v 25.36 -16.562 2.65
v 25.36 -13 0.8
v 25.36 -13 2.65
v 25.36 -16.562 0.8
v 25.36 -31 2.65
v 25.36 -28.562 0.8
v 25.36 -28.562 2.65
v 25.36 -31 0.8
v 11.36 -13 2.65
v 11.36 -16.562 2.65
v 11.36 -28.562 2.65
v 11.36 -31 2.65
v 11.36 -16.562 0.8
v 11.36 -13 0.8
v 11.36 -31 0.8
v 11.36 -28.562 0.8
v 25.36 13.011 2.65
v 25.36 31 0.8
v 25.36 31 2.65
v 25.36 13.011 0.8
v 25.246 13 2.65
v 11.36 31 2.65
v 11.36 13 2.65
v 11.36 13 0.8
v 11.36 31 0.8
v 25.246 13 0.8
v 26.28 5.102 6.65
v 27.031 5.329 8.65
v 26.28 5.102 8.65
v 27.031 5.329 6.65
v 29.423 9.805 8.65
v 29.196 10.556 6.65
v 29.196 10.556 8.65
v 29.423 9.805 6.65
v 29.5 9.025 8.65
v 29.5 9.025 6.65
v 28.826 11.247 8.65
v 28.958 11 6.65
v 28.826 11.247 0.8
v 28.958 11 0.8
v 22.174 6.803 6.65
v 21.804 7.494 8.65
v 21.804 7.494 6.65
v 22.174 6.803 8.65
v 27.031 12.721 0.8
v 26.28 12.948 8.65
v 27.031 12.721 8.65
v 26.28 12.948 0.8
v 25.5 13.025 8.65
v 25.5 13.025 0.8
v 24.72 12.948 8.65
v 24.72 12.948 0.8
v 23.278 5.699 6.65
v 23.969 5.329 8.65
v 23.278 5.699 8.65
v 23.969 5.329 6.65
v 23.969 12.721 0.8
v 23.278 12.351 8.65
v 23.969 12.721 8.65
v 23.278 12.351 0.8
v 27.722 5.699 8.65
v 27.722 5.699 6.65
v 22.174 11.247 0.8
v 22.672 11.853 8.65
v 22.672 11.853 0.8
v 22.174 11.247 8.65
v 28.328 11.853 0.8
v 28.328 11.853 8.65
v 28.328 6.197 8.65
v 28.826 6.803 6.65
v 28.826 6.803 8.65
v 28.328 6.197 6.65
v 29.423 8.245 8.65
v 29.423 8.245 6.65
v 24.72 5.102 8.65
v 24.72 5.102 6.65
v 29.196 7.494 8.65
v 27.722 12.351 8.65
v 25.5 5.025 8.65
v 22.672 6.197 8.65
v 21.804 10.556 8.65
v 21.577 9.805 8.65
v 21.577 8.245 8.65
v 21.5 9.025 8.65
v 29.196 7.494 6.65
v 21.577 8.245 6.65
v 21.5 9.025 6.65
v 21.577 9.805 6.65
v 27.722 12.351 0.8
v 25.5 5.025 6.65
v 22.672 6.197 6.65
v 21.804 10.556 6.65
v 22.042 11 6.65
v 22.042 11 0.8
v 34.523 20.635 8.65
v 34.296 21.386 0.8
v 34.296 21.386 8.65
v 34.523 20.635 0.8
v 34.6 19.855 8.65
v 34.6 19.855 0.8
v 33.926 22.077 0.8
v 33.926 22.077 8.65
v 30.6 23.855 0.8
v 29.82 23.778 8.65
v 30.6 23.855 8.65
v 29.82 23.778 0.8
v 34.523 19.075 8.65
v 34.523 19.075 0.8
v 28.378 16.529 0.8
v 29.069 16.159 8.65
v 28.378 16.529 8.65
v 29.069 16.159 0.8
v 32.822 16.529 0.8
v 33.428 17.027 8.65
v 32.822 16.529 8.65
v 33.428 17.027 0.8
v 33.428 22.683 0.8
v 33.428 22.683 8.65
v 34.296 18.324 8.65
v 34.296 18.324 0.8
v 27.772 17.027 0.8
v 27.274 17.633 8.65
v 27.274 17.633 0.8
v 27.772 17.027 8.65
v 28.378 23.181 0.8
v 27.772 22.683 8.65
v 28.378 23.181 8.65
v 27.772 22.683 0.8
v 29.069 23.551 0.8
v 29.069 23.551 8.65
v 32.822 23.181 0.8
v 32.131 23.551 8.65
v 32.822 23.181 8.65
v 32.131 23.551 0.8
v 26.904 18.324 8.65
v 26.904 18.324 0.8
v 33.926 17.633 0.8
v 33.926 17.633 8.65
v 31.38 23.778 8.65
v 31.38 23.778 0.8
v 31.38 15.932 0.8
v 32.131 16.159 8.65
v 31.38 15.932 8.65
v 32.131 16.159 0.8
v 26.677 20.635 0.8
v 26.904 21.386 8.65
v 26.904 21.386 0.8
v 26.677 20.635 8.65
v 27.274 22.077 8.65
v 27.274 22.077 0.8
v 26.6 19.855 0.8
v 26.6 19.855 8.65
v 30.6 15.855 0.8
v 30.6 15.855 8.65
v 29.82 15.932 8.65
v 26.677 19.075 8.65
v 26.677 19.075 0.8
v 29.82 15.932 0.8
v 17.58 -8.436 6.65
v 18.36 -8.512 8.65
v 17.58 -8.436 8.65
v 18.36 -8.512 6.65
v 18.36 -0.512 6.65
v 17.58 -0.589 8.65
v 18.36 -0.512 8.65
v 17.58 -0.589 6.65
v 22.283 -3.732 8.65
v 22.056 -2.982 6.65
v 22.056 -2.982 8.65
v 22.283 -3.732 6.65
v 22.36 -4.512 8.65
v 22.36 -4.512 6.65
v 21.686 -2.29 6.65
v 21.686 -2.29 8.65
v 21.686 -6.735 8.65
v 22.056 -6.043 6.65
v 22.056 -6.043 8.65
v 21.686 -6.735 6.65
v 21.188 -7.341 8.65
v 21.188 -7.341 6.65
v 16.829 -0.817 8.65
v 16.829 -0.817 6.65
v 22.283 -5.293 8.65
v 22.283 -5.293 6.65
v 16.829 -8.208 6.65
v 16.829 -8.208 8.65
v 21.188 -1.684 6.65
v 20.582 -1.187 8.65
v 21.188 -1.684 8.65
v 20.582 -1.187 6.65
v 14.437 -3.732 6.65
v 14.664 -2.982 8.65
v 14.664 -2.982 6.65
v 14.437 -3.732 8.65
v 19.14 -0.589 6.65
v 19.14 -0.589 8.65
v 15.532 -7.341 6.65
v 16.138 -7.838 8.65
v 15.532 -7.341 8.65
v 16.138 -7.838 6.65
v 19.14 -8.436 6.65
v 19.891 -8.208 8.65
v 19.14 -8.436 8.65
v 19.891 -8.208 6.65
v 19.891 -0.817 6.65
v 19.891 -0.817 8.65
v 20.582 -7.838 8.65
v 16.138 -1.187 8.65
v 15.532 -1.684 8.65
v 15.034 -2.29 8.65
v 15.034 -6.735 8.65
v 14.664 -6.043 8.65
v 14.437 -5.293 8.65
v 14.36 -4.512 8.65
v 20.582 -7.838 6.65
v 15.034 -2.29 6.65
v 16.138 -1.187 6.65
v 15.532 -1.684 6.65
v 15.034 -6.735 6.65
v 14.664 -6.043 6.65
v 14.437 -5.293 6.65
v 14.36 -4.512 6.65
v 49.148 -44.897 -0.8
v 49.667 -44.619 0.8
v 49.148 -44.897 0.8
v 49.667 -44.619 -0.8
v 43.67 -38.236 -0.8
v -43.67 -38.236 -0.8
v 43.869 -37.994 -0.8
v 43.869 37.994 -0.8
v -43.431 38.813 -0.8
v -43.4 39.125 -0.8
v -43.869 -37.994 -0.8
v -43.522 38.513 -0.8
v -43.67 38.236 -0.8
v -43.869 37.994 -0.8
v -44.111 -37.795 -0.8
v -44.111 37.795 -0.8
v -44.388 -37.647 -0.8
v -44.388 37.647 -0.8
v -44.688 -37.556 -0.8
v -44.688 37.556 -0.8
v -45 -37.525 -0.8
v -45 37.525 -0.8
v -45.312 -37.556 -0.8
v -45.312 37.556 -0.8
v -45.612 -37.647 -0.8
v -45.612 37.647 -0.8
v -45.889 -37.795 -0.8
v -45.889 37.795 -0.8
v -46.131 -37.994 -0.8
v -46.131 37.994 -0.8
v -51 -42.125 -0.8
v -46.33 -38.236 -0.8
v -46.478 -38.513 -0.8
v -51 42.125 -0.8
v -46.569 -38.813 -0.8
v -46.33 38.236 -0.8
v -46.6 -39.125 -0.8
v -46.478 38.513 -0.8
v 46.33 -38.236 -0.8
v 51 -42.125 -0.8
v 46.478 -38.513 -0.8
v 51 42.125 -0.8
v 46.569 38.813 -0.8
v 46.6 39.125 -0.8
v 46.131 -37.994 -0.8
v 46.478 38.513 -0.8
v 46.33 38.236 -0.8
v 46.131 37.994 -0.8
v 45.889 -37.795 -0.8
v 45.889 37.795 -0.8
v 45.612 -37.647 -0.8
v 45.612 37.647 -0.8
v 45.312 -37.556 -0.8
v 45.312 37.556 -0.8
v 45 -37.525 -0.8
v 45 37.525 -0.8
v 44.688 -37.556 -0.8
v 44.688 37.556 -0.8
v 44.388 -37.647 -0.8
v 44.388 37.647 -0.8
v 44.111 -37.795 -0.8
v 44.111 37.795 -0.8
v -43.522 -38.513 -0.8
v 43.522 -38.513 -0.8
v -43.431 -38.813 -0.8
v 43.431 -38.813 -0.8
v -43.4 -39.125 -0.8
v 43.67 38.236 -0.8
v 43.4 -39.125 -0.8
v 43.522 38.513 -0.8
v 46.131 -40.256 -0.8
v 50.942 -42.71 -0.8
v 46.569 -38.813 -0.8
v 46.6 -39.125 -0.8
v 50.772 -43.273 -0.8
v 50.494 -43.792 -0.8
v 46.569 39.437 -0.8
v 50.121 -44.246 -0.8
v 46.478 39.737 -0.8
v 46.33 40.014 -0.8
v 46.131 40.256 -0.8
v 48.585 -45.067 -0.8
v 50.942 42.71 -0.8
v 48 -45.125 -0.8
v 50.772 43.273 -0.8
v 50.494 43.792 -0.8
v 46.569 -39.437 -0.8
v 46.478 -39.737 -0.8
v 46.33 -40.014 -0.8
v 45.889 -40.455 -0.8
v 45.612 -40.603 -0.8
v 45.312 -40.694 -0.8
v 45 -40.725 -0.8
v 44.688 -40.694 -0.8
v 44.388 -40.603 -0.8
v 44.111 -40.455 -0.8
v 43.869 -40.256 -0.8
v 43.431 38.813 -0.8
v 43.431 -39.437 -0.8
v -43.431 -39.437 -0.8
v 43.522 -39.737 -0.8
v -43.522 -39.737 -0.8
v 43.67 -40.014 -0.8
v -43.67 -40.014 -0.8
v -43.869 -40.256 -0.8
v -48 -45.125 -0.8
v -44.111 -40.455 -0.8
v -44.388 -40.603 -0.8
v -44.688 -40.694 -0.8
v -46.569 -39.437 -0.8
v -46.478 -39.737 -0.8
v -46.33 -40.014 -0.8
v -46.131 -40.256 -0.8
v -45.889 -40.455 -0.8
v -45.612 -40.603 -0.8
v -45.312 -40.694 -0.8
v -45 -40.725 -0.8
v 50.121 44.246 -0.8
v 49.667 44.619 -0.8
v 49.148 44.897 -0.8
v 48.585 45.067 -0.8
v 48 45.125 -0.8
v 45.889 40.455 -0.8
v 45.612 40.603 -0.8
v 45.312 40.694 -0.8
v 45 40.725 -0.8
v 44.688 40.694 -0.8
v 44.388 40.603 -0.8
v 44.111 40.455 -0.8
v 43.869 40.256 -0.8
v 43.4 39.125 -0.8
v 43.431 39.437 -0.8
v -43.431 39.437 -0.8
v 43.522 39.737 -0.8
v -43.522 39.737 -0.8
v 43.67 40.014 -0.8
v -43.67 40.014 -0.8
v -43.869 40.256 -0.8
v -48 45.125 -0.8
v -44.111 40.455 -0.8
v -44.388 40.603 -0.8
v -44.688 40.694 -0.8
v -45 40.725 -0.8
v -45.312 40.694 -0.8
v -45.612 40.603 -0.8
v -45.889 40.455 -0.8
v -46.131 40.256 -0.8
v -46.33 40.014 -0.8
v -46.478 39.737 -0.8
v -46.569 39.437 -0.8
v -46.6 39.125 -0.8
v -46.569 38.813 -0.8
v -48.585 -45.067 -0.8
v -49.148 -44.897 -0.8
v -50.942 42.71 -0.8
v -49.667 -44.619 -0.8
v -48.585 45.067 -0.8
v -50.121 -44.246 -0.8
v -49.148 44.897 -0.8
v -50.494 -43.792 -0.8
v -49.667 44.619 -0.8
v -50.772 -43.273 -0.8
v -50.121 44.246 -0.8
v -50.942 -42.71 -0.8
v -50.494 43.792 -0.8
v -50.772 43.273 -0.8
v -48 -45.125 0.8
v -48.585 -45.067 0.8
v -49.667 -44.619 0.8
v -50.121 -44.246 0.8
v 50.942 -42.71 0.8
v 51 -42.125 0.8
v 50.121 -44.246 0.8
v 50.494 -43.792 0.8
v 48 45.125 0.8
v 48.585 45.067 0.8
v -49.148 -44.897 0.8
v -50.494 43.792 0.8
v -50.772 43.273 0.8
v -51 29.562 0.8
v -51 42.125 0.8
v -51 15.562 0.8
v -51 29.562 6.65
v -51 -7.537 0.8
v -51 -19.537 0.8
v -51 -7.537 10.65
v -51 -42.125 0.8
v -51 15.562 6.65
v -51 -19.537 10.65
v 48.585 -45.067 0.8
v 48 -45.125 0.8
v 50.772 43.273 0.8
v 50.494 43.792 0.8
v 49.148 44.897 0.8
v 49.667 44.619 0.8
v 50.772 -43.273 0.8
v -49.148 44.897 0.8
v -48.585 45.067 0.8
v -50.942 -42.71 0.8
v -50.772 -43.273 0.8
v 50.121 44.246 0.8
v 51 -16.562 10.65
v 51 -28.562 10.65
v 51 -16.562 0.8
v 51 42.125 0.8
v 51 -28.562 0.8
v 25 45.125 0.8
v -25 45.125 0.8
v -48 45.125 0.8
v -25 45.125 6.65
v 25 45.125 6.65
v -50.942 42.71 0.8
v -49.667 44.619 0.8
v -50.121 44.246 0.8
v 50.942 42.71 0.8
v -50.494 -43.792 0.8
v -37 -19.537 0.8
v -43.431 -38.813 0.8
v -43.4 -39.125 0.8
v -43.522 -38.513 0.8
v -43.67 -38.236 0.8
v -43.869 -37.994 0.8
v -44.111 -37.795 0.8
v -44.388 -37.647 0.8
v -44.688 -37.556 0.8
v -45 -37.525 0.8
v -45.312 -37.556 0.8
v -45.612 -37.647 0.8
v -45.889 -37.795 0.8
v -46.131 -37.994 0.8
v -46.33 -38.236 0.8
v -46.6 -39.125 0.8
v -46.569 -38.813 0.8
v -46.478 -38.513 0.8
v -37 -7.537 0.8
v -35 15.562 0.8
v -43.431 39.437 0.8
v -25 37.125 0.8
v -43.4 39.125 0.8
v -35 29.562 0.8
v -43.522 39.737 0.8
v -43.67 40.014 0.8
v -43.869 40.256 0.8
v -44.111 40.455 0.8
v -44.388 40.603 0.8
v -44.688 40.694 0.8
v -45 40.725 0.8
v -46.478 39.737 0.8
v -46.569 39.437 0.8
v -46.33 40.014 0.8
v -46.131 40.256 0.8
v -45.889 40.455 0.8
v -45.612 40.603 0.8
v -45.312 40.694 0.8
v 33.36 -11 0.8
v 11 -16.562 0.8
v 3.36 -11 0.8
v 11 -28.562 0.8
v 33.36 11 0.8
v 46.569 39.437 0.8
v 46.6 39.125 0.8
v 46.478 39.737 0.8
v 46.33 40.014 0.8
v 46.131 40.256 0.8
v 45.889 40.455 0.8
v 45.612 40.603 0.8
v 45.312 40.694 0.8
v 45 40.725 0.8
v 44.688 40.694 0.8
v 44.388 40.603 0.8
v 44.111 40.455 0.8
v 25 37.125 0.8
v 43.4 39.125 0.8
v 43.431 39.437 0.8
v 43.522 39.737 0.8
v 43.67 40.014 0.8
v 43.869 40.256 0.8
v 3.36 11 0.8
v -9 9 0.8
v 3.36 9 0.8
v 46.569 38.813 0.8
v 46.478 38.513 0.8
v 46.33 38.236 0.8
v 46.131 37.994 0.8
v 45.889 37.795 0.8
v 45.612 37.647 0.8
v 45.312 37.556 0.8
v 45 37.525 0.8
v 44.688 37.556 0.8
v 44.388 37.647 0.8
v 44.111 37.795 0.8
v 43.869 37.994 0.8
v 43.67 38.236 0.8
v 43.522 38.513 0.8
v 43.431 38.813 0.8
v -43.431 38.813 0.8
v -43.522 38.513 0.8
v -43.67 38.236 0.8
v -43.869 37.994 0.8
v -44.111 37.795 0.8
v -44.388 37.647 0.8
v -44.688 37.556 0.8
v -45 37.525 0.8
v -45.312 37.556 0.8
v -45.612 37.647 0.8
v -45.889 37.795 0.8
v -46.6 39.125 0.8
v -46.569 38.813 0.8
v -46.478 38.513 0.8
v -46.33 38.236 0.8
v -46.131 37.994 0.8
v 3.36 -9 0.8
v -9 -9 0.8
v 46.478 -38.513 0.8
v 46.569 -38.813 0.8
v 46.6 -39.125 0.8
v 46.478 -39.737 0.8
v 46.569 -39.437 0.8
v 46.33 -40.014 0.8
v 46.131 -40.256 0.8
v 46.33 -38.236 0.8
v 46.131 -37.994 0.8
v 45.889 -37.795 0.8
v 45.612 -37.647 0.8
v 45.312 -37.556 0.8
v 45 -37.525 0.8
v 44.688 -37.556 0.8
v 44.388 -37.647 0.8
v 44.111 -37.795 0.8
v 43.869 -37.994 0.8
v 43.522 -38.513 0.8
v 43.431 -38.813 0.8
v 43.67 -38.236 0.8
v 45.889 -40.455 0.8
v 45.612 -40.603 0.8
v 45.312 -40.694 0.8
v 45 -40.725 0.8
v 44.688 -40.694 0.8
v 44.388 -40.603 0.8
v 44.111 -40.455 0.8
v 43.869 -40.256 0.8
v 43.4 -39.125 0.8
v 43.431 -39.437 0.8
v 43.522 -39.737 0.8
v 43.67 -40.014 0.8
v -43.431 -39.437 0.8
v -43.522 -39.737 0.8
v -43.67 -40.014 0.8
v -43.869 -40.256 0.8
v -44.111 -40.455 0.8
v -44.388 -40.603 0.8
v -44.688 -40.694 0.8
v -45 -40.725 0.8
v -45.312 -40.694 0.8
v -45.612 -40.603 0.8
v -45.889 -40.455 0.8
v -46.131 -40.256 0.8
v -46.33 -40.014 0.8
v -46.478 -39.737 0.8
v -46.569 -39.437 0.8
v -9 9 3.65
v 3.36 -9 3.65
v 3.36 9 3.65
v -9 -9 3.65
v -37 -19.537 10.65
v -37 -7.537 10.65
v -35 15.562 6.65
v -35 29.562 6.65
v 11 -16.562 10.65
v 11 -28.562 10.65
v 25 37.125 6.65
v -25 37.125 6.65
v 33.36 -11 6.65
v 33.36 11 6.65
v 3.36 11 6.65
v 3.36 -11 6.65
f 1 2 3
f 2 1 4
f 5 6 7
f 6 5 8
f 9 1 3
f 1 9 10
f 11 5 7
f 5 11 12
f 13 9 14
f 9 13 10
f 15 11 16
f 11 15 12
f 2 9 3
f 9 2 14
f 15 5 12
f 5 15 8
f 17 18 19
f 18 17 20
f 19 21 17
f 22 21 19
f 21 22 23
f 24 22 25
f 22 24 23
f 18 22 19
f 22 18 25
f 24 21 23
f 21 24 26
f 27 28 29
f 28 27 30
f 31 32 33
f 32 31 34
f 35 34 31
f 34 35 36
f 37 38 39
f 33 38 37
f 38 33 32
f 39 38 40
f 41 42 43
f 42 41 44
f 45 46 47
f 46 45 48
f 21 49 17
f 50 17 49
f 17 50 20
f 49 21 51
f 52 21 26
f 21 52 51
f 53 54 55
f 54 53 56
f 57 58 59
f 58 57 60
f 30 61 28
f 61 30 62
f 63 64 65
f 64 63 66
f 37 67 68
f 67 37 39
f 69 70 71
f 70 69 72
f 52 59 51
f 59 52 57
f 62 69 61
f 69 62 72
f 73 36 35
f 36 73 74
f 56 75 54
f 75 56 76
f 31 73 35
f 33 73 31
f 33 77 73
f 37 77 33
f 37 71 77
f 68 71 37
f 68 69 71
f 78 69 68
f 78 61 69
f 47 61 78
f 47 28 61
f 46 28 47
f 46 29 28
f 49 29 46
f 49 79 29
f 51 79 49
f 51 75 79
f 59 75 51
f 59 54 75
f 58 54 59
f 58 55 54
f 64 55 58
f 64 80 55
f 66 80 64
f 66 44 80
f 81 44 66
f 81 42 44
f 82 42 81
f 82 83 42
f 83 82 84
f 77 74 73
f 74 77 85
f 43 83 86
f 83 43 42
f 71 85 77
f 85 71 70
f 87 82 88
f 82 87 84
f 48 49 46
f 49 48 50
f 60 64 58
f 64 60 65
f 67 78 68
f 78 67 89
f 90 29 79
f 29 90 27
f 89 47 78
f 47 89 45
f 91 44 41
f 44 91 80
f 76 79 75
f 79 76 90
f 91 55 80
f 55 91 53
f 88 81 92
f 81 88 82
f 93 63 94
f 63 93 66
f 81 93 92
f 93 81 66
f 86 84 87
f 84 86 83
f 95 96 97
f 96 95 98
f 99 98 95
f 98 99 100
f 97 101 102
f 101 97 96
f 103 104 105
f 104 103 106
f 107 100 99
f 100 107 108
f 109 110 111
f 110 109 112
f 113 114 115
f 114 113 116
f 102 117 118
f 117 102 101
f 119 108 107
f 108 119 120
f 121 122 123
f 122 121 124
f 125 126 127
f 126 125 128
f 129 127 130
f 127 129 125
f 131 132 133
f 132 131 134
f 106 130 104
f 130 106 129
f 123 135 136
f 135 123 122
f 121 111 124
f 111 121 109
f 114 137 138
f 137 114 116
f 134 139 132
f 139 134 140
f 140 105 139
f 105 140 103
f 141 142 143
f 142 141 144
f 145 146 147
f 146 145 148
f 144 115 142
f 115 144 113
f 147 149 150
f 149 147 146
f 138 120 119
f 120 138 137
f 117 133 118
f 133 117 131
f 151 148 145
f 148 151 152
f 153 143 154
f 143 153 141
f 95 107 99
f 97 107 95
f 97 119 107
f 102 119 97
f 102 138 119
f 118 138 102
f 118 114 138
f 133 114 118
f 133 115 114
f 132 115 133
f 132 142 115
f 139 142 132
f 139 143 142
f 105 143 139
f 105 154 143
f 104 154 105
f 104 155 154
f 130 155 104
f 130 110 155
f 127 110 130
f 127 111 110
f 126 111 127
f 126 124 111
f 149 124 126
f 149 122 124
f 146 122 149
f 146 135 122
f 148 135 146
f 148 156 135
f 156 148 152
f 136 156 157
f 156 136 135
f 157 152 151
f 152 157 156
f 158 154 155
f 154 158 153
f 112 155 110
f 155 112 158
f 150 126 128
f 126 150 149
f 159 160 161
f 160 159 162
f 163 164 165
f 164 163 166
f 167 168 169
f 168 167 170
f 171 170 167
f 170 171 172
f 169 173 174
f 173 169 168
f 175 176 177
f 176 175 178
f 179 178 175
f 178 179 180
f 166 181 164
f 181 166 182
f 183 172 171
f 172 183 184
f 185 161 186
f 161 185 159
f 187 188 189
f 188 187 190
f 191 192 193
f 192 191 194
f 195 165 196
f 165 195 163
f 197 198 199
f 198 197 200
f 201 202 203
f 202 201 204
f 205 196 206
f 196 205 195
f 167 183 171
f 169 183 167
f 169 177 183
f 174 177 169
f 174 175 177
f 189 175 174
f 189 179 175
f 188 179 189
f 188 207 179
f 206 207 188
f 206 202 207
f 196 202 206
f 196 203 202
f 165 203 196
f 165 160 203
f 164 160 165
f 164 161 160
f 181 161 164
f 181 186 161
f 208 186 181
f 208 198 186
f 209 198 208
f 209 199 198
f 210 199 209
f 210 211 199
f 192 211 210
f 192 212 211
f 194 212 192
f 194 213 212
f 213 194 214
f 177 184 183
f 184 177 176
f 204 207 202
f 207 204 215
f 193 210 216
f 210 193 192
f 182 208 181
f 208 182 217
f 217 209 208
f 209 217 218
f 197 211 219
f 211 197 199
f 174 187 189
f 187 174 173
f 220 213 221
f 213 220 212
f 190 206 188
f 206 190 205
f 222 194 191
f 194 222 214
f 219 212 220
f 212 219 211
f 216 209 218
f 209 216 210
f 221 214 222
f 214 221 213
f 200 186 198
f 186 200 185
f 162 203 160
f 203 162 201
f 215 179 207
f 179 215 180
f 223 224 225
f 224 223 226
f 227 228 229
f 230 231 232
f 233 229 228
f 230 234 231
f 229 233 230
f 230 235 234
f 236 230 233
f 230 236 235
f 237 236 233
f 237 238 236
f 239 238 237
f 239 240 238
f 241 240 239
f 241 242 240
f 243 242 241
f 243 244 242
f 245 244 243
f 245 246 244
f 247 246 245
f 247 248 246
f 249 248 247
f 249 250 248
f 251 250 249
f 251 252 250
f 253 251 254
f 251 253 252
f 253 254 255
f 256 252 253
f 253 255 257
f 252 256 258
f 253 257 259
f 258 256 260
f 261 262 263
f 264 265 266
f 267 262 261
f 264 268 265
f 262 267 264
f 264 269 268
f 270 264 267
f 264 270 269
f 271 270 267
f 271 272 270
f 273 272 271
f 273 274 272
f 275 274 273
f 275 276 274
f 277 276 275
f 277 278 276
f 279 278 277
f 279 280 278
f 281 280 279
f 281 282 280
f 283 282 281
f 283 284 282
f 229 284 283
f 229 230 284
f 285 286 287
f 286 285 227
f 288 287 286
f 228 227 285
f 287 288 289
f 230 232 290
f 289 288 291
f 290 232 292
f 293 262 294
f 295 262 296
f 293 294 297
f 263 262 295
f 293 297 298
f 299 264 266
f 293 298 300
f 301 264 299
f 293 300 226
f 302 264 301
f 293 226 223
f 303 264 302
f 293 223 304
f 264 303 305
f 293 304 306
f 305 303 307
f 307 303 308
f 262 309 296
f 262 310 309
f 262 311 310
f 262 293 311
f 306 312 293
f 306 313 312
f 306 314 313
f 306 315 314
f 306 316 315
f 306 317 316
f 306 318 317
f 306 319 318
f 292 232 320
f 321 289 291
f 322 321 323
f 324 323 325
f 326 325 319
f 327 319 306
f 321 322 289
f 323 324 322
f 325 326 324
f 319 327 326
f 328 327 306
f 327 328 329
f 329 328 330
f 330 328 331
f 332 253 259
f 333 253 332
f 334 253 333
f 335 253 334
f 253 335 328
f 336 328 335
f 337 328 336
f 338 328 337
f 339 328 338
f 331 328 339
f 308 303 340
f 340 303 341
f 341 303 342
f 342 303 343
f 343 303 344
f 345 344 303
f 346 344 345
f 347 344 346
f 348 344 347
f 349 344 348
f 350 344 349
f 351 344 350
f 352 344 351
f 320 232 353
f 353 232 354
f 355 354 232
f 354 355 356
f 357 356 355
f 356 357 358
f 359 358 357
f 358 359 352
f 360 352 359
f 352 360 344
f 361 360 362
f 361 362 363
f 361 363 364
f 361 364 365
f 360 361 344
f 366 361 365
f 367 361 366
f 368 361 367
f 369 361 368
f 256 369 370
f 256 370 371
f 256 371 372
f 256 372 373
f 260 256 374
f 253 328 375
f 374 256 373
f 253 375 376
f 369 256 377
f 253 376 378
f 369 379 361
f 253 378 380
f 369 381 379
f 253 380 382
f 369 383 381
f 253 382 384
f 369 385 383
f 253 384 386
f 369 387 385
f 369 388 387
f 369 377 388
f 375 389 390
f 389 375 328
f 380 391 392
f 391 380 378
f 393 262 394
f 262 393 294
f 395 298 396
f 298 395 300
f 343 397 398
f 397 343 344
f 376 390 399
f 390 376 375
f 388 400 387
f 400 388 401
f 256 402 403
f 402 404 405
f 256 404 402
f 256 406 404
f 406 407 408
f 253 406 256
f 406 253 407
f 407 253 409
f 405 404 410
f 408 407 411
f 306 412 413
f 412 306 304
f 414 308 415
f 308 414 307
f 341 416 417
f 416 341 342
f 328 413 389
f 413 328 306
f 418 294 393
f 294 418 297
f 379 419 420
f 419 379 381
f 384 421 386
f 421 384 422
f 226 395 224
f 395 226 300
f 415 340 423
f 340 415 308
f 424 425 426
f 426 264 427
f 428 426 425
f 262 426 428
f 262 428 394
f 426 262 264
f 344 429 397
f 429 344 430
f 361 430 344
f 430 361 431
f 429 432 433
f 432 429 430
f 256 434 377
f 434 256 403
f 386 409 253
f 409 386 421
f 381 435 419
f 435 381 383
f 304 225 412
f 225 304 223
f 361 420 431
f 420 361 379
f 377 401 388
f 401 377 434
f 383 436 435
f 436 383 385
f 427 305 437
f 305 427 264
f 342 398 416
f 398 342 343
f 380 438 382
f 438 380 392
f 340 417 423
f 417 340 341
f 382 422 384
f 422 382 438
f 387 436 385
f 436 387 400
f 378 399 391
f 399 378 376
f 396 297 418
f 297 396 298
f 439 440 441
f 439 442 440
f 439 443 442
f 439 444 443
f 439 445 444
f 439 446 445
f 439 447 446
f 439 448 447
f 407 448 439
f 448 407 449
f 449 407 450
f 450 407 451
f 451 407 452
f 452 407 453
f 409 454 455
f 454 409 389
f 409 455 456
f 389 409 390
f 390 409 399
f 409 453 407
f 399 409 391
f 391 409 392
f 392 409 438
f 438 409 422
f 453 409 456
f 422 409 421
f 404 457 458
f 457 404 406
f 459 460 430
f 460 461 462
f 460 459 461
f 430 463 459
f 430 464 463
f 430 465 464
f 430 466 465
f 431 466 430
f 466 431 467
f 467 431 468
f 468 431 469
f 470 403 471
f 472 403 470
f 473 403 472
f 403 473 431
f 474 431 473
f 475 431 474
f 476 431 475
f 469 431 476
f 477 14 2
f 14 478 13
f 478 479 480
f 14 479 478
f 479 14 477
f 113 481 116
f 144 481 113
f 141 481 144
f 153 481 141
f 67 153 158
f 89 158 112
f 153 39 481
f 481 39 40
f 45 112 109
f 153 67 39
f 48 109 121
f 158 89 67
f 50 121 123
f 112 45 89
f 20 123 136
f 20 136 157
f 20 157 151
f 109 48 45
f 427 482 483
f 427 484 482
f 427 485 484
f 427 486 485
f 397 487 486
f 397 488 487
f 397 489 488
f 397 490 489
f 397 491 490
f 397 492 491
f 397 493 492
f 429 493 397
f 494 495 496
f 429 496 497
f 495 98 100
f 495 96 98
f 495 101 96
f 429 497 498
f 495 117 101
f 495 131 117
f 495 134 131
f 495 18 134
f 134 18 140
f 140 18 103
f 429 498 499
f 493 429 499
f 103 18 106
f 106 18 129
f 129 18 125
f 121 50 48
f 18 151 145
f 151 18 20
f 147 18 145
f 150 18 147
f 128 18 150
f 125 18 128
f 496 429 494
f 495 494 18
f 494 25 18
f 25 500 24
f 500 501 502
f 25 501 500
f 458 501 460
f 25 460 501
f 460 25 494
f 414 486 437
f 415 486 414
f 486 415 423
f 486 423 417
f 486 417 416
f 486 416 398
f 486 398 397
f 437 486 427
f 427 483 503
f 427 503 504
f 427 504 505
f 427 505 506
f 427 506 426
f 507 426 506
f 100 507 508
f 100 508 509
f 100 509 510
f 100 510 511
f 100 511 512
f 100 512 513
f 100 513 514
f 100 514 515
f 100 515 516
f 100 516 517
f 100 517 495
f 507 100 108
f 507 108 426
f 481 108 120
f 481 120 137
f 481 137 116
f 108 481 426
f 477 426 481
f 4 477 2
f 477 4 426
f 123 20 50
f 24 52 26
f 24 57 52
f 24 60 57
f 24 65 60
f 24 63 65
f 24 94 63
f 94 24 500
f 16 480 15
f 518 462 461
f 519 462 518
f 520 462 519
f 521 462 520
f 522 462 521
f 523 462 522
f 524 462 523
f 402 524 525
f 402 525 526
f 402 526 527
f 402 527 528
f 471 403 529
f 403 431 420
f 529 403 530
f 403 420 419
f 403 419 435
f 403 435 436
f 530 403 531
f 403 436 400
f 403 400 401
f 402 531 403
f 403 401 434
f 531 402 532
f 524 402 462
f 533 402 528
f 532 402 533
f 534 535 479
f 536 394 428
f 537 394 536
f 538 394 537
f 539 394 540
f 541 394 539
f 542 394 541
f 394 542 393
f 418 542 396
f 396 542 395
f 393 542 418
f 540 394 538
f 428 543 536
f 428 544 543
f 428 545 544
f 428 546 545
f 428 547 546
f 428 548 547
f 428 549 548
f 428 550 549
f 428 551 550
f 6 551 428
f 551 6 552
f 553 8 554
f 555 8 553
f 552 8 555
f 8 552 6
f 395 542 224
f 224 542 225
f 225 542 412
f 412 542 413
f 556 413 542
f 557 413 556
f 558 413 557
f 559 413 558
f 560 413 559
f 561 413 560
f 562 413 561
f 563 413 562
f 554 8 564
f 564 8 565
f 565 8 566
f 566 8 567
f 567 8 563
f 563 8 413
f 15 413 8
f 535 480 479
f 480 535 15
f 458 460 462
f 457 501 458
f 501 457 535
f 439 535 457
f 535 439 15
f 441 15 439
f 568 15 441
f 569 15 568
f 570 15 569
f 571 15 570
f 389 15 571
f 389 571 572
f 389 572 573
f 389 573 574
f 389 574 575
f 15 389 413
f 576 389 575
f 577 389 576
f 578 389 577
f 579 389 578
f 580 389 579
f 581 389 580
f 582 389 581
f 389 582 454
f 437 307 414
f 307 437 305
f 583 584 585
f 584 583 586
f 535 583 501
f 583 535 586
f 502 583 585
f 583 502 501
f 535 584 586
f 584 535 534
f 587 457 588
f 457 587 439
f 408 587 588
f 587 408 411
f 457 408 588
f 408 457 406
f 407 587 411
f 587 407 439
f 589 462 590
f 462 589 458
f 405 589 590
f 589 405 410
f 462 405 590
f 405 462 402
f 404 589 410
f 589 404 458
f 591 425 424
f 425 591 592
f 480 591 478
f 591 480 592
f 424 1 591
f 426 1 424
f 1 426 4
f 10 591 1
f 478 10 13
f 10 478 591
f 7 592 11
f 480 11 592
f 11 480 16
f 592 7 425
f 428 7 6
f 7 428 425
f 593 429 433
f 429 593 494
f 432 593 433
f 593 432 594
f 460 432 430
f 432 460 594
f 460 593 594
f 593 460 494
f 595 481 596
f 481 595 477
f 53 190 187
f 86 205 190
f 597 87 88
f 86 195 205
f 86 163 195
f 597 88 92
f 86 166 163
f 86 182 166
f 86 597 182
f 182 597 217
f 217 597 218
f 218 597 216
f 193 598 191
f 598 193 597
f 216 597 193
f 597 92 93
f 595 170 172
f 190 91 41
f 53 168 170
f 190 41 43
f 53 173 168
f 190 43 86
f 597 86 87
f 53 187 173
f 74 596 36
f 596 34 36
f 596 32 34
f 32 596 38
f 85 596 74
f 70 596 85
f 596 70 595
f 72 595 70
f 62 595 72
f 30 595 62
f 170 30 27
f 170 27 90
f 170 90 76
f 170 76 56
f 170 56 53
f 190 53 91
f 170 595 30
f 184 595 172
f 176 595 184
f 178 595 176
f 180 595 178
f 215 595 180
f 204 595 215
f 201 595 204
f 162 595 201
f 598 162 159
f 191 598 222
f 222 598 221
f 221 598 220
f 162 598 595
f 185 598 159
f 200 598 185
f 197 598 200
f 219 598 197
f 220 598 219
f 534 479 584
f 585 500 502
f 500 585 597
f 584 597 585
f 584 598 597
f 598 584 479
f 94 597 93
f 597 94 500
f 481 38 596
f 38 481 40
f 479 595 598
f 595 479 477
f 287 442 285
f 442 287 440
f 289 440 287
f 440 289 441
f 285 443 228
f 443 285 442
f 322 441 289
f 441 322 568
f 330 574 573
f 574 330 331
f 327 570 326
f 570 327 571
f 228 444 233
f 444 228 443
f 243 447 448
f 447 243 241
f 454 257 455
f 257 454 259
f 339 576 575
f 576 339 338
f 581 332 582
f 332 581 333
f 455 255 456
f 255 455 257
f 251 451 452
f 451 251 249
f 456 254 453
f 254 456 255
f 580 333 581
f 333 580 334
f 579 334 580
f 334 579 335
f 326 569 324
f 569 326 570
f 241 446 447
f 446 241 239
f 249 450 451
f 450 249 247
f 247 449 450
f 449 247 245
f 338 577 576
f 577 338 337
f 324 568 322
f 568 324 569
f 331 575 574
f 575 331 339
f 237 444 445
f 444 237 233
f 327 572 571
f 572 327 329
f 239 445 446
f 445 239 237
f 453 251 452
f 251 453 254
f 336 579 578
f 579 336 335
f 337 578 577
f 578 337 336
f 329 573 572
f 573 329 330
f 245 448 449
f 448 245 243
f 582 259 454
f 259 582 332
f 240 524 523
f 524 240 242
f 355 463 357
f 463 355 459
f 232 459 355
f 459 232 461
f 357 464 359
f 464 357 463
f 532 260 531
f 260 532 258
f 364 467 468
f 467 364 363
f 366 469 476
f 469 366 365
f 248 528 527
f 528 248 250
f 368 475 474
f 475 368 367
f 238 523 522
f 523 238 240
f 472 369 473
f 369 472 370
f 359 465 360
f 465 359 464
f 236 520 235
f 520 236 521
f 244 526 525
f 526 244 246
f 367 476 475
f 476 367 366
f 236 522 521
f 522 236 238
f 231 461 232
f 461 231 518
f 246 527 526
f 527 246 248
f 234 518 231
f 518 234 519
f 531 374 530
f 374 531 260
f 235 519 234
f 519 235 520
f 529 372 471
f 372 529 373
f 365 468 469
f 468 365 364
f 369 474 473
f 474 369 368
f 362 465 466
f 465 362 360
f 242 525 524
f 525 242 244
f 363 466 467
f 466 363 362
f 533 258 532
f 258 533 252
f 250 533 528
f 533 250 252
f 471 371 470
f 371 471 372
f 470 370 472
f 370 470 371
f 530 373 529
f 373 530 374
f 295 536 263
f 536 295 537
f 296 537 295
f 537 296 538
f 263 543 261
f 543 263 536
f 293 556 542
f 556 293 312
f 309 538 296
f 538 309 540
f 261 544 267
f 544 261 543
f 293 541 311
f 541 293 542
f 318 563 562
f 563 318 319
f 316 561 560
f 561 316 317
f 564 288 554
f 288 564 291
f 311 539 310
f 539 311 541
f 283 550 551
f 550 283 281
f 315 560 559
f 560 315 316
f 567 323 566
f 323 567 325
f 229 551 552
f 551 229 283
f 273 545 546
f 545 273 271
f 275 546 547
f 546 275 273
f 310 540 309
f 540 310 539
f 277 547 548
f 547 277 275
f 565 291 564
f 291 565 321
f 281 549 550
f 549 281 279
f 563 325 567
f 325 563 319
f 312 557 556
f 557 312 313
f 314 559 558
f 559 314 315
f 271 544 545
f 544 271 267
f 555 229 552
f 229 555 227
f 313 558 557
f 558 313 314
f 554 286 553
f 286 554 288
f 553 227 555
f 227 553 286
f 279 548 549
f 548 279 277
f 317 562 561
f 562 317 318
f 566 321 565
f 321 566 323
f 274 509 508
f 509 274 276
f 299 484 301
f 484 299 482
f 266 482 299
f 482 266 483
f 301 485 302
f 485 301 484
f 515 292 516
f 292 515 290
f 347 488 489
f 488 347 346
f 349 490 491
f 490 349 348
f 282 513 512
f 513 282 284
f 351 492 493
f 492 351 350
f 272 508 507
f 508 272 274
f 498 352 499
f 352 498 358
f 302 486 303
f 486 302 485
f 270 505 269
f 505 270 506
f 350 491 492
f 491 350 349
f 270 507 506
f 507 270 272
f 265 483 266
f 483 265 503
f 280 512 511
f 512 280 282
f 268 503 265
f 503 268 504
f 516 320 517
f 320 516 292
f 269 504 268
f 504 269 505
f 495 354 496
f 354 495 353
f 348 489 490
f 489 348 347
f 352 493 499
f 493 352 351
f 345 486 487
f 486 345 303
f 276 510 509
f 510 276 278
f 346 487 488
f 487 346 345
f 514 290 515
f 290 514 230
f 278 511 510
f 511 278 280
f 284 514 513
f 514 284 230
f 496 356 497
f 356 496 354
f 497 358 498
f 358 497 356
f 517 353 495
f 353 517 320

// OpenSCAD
$fn = 32;

// Mainboard overall size (mm)
board_x  = 102.0;
board_y  = 90.25;
board_th = 1.6;

// Small overlap to guarantee watertight unions
ov = 0.15;

// ---------- Helpers ----------
module rounded_plate(x, y, z, r) {
    // Fast rounded rectangle prism using 2D offset (no minkowski)
    linear_extrude(height=z, center=true, convexity=5)
        offset(r=r)
            square([x-2*r, y-2*r], center=true);
}

module box_solid(x, y, z) { cube([x,y,z], center=true); }

// ---------- Board + features ----------
module mainboard() {

    corner_r = 3;

    // Mounting holes (typical M3 clearance)
    hole_d = 3.2;
    hole_edge_x = 6.0;
    hole_edge_y = 6.0;

    // Component heights
    comp_base_h = 2.0;
    ic_h        = 3.0;
    conn_h      = 10.0;

    // Component footprints
    ic_x = 18; ic_y = 18;
    driver_x = 14; driver_y = 18;

    // Connectors (approximate)
    usb_x = 14; usb_y = 12;
    sd_x  = 16; sd_y  = 14;
    term_x = 40; term_y = 12;
    pin_x  = 50; pin_y  = 8;

    // Z placement
    z_top_surface = board_th/2;
    function z_comp(comp_h) = z_top_surface + comp_h/2 - ov;

    difference() {
        union() {
            // PCB
            color([0.05, 0.45, 0.18])
                rounded_plate(board_x, board_y, board_th, corner_r);

            // Central MCU/SoC
            translate([0, 0, z_comp(ic_h)])
                box_solid(ic_x, ic_y, ic_h);

            // Stepper driver modules (3x)
            for (i = [-1, 0, 1]) {
                translate([board_x*0.18, i*(driver_y+4), z_comp(comp_base_h)])
                    box_solid(driver_x, driver_y, comp_base_h);
            }

            // USB connector on left edge
            translate([-(board_x/2 - usb_x/2), -(board_y*0.15), z_comp(conn_h)])
                box_solid(usb_x, usb_y, conn_h);

            // SD card slot on left edge (toward top)
            translate([-(board_x/2 - sd_x/2), (board_y*0.25), z_comp(6)])
                box_solid(sd_x, sd_y, 6);

            // Screw terminal block on right edge
            translate([(board_x/2 - term_x/2), -(board_y*0.25), z_comp(conn_h)])
                box_solid(term_x, term_y, conn_h);

            // Long pin header along top edge
            translate([0, (board_y/2 - pin_y/2), z_comp(6)])
                box_solid(pin_x, pin_y, 6);

            // Capacitors (reduced segmentation via $fn=32)
            cap_r = 4;
            cap_h = 8;
            for (p = [[board_x*0.25, board_y*0.10],
                      [board_x*0.30, board_y*0.22],
                      [board_x*0.18, -board_y*0.05]]) {
                translate([p[0], p[1], z_comp(cap_h)])
                    cylinder(r=cap_r, h=cap_h, center=true);
            }

            // Heatsink-ish block near drivers
            hs_x = 30; hs_y = 22; hs_h = 6;
            translate([board_x*0.18, 0, z_comp(hs_h)])
                box_solid(hs_x, hs_y, hs_h);
        }

        // Mounting holes through PCB
        for (sx = [-1, 1], sy = [-1, 1]) {
            translate([sx*(board_x/2 - hole_edge_x), sy*(board_y/2 - hole_edge_y), 0])
                cylinder(d=hole_d, h=board_th + 2, center=true);
        }
    }
}

mainboard();
